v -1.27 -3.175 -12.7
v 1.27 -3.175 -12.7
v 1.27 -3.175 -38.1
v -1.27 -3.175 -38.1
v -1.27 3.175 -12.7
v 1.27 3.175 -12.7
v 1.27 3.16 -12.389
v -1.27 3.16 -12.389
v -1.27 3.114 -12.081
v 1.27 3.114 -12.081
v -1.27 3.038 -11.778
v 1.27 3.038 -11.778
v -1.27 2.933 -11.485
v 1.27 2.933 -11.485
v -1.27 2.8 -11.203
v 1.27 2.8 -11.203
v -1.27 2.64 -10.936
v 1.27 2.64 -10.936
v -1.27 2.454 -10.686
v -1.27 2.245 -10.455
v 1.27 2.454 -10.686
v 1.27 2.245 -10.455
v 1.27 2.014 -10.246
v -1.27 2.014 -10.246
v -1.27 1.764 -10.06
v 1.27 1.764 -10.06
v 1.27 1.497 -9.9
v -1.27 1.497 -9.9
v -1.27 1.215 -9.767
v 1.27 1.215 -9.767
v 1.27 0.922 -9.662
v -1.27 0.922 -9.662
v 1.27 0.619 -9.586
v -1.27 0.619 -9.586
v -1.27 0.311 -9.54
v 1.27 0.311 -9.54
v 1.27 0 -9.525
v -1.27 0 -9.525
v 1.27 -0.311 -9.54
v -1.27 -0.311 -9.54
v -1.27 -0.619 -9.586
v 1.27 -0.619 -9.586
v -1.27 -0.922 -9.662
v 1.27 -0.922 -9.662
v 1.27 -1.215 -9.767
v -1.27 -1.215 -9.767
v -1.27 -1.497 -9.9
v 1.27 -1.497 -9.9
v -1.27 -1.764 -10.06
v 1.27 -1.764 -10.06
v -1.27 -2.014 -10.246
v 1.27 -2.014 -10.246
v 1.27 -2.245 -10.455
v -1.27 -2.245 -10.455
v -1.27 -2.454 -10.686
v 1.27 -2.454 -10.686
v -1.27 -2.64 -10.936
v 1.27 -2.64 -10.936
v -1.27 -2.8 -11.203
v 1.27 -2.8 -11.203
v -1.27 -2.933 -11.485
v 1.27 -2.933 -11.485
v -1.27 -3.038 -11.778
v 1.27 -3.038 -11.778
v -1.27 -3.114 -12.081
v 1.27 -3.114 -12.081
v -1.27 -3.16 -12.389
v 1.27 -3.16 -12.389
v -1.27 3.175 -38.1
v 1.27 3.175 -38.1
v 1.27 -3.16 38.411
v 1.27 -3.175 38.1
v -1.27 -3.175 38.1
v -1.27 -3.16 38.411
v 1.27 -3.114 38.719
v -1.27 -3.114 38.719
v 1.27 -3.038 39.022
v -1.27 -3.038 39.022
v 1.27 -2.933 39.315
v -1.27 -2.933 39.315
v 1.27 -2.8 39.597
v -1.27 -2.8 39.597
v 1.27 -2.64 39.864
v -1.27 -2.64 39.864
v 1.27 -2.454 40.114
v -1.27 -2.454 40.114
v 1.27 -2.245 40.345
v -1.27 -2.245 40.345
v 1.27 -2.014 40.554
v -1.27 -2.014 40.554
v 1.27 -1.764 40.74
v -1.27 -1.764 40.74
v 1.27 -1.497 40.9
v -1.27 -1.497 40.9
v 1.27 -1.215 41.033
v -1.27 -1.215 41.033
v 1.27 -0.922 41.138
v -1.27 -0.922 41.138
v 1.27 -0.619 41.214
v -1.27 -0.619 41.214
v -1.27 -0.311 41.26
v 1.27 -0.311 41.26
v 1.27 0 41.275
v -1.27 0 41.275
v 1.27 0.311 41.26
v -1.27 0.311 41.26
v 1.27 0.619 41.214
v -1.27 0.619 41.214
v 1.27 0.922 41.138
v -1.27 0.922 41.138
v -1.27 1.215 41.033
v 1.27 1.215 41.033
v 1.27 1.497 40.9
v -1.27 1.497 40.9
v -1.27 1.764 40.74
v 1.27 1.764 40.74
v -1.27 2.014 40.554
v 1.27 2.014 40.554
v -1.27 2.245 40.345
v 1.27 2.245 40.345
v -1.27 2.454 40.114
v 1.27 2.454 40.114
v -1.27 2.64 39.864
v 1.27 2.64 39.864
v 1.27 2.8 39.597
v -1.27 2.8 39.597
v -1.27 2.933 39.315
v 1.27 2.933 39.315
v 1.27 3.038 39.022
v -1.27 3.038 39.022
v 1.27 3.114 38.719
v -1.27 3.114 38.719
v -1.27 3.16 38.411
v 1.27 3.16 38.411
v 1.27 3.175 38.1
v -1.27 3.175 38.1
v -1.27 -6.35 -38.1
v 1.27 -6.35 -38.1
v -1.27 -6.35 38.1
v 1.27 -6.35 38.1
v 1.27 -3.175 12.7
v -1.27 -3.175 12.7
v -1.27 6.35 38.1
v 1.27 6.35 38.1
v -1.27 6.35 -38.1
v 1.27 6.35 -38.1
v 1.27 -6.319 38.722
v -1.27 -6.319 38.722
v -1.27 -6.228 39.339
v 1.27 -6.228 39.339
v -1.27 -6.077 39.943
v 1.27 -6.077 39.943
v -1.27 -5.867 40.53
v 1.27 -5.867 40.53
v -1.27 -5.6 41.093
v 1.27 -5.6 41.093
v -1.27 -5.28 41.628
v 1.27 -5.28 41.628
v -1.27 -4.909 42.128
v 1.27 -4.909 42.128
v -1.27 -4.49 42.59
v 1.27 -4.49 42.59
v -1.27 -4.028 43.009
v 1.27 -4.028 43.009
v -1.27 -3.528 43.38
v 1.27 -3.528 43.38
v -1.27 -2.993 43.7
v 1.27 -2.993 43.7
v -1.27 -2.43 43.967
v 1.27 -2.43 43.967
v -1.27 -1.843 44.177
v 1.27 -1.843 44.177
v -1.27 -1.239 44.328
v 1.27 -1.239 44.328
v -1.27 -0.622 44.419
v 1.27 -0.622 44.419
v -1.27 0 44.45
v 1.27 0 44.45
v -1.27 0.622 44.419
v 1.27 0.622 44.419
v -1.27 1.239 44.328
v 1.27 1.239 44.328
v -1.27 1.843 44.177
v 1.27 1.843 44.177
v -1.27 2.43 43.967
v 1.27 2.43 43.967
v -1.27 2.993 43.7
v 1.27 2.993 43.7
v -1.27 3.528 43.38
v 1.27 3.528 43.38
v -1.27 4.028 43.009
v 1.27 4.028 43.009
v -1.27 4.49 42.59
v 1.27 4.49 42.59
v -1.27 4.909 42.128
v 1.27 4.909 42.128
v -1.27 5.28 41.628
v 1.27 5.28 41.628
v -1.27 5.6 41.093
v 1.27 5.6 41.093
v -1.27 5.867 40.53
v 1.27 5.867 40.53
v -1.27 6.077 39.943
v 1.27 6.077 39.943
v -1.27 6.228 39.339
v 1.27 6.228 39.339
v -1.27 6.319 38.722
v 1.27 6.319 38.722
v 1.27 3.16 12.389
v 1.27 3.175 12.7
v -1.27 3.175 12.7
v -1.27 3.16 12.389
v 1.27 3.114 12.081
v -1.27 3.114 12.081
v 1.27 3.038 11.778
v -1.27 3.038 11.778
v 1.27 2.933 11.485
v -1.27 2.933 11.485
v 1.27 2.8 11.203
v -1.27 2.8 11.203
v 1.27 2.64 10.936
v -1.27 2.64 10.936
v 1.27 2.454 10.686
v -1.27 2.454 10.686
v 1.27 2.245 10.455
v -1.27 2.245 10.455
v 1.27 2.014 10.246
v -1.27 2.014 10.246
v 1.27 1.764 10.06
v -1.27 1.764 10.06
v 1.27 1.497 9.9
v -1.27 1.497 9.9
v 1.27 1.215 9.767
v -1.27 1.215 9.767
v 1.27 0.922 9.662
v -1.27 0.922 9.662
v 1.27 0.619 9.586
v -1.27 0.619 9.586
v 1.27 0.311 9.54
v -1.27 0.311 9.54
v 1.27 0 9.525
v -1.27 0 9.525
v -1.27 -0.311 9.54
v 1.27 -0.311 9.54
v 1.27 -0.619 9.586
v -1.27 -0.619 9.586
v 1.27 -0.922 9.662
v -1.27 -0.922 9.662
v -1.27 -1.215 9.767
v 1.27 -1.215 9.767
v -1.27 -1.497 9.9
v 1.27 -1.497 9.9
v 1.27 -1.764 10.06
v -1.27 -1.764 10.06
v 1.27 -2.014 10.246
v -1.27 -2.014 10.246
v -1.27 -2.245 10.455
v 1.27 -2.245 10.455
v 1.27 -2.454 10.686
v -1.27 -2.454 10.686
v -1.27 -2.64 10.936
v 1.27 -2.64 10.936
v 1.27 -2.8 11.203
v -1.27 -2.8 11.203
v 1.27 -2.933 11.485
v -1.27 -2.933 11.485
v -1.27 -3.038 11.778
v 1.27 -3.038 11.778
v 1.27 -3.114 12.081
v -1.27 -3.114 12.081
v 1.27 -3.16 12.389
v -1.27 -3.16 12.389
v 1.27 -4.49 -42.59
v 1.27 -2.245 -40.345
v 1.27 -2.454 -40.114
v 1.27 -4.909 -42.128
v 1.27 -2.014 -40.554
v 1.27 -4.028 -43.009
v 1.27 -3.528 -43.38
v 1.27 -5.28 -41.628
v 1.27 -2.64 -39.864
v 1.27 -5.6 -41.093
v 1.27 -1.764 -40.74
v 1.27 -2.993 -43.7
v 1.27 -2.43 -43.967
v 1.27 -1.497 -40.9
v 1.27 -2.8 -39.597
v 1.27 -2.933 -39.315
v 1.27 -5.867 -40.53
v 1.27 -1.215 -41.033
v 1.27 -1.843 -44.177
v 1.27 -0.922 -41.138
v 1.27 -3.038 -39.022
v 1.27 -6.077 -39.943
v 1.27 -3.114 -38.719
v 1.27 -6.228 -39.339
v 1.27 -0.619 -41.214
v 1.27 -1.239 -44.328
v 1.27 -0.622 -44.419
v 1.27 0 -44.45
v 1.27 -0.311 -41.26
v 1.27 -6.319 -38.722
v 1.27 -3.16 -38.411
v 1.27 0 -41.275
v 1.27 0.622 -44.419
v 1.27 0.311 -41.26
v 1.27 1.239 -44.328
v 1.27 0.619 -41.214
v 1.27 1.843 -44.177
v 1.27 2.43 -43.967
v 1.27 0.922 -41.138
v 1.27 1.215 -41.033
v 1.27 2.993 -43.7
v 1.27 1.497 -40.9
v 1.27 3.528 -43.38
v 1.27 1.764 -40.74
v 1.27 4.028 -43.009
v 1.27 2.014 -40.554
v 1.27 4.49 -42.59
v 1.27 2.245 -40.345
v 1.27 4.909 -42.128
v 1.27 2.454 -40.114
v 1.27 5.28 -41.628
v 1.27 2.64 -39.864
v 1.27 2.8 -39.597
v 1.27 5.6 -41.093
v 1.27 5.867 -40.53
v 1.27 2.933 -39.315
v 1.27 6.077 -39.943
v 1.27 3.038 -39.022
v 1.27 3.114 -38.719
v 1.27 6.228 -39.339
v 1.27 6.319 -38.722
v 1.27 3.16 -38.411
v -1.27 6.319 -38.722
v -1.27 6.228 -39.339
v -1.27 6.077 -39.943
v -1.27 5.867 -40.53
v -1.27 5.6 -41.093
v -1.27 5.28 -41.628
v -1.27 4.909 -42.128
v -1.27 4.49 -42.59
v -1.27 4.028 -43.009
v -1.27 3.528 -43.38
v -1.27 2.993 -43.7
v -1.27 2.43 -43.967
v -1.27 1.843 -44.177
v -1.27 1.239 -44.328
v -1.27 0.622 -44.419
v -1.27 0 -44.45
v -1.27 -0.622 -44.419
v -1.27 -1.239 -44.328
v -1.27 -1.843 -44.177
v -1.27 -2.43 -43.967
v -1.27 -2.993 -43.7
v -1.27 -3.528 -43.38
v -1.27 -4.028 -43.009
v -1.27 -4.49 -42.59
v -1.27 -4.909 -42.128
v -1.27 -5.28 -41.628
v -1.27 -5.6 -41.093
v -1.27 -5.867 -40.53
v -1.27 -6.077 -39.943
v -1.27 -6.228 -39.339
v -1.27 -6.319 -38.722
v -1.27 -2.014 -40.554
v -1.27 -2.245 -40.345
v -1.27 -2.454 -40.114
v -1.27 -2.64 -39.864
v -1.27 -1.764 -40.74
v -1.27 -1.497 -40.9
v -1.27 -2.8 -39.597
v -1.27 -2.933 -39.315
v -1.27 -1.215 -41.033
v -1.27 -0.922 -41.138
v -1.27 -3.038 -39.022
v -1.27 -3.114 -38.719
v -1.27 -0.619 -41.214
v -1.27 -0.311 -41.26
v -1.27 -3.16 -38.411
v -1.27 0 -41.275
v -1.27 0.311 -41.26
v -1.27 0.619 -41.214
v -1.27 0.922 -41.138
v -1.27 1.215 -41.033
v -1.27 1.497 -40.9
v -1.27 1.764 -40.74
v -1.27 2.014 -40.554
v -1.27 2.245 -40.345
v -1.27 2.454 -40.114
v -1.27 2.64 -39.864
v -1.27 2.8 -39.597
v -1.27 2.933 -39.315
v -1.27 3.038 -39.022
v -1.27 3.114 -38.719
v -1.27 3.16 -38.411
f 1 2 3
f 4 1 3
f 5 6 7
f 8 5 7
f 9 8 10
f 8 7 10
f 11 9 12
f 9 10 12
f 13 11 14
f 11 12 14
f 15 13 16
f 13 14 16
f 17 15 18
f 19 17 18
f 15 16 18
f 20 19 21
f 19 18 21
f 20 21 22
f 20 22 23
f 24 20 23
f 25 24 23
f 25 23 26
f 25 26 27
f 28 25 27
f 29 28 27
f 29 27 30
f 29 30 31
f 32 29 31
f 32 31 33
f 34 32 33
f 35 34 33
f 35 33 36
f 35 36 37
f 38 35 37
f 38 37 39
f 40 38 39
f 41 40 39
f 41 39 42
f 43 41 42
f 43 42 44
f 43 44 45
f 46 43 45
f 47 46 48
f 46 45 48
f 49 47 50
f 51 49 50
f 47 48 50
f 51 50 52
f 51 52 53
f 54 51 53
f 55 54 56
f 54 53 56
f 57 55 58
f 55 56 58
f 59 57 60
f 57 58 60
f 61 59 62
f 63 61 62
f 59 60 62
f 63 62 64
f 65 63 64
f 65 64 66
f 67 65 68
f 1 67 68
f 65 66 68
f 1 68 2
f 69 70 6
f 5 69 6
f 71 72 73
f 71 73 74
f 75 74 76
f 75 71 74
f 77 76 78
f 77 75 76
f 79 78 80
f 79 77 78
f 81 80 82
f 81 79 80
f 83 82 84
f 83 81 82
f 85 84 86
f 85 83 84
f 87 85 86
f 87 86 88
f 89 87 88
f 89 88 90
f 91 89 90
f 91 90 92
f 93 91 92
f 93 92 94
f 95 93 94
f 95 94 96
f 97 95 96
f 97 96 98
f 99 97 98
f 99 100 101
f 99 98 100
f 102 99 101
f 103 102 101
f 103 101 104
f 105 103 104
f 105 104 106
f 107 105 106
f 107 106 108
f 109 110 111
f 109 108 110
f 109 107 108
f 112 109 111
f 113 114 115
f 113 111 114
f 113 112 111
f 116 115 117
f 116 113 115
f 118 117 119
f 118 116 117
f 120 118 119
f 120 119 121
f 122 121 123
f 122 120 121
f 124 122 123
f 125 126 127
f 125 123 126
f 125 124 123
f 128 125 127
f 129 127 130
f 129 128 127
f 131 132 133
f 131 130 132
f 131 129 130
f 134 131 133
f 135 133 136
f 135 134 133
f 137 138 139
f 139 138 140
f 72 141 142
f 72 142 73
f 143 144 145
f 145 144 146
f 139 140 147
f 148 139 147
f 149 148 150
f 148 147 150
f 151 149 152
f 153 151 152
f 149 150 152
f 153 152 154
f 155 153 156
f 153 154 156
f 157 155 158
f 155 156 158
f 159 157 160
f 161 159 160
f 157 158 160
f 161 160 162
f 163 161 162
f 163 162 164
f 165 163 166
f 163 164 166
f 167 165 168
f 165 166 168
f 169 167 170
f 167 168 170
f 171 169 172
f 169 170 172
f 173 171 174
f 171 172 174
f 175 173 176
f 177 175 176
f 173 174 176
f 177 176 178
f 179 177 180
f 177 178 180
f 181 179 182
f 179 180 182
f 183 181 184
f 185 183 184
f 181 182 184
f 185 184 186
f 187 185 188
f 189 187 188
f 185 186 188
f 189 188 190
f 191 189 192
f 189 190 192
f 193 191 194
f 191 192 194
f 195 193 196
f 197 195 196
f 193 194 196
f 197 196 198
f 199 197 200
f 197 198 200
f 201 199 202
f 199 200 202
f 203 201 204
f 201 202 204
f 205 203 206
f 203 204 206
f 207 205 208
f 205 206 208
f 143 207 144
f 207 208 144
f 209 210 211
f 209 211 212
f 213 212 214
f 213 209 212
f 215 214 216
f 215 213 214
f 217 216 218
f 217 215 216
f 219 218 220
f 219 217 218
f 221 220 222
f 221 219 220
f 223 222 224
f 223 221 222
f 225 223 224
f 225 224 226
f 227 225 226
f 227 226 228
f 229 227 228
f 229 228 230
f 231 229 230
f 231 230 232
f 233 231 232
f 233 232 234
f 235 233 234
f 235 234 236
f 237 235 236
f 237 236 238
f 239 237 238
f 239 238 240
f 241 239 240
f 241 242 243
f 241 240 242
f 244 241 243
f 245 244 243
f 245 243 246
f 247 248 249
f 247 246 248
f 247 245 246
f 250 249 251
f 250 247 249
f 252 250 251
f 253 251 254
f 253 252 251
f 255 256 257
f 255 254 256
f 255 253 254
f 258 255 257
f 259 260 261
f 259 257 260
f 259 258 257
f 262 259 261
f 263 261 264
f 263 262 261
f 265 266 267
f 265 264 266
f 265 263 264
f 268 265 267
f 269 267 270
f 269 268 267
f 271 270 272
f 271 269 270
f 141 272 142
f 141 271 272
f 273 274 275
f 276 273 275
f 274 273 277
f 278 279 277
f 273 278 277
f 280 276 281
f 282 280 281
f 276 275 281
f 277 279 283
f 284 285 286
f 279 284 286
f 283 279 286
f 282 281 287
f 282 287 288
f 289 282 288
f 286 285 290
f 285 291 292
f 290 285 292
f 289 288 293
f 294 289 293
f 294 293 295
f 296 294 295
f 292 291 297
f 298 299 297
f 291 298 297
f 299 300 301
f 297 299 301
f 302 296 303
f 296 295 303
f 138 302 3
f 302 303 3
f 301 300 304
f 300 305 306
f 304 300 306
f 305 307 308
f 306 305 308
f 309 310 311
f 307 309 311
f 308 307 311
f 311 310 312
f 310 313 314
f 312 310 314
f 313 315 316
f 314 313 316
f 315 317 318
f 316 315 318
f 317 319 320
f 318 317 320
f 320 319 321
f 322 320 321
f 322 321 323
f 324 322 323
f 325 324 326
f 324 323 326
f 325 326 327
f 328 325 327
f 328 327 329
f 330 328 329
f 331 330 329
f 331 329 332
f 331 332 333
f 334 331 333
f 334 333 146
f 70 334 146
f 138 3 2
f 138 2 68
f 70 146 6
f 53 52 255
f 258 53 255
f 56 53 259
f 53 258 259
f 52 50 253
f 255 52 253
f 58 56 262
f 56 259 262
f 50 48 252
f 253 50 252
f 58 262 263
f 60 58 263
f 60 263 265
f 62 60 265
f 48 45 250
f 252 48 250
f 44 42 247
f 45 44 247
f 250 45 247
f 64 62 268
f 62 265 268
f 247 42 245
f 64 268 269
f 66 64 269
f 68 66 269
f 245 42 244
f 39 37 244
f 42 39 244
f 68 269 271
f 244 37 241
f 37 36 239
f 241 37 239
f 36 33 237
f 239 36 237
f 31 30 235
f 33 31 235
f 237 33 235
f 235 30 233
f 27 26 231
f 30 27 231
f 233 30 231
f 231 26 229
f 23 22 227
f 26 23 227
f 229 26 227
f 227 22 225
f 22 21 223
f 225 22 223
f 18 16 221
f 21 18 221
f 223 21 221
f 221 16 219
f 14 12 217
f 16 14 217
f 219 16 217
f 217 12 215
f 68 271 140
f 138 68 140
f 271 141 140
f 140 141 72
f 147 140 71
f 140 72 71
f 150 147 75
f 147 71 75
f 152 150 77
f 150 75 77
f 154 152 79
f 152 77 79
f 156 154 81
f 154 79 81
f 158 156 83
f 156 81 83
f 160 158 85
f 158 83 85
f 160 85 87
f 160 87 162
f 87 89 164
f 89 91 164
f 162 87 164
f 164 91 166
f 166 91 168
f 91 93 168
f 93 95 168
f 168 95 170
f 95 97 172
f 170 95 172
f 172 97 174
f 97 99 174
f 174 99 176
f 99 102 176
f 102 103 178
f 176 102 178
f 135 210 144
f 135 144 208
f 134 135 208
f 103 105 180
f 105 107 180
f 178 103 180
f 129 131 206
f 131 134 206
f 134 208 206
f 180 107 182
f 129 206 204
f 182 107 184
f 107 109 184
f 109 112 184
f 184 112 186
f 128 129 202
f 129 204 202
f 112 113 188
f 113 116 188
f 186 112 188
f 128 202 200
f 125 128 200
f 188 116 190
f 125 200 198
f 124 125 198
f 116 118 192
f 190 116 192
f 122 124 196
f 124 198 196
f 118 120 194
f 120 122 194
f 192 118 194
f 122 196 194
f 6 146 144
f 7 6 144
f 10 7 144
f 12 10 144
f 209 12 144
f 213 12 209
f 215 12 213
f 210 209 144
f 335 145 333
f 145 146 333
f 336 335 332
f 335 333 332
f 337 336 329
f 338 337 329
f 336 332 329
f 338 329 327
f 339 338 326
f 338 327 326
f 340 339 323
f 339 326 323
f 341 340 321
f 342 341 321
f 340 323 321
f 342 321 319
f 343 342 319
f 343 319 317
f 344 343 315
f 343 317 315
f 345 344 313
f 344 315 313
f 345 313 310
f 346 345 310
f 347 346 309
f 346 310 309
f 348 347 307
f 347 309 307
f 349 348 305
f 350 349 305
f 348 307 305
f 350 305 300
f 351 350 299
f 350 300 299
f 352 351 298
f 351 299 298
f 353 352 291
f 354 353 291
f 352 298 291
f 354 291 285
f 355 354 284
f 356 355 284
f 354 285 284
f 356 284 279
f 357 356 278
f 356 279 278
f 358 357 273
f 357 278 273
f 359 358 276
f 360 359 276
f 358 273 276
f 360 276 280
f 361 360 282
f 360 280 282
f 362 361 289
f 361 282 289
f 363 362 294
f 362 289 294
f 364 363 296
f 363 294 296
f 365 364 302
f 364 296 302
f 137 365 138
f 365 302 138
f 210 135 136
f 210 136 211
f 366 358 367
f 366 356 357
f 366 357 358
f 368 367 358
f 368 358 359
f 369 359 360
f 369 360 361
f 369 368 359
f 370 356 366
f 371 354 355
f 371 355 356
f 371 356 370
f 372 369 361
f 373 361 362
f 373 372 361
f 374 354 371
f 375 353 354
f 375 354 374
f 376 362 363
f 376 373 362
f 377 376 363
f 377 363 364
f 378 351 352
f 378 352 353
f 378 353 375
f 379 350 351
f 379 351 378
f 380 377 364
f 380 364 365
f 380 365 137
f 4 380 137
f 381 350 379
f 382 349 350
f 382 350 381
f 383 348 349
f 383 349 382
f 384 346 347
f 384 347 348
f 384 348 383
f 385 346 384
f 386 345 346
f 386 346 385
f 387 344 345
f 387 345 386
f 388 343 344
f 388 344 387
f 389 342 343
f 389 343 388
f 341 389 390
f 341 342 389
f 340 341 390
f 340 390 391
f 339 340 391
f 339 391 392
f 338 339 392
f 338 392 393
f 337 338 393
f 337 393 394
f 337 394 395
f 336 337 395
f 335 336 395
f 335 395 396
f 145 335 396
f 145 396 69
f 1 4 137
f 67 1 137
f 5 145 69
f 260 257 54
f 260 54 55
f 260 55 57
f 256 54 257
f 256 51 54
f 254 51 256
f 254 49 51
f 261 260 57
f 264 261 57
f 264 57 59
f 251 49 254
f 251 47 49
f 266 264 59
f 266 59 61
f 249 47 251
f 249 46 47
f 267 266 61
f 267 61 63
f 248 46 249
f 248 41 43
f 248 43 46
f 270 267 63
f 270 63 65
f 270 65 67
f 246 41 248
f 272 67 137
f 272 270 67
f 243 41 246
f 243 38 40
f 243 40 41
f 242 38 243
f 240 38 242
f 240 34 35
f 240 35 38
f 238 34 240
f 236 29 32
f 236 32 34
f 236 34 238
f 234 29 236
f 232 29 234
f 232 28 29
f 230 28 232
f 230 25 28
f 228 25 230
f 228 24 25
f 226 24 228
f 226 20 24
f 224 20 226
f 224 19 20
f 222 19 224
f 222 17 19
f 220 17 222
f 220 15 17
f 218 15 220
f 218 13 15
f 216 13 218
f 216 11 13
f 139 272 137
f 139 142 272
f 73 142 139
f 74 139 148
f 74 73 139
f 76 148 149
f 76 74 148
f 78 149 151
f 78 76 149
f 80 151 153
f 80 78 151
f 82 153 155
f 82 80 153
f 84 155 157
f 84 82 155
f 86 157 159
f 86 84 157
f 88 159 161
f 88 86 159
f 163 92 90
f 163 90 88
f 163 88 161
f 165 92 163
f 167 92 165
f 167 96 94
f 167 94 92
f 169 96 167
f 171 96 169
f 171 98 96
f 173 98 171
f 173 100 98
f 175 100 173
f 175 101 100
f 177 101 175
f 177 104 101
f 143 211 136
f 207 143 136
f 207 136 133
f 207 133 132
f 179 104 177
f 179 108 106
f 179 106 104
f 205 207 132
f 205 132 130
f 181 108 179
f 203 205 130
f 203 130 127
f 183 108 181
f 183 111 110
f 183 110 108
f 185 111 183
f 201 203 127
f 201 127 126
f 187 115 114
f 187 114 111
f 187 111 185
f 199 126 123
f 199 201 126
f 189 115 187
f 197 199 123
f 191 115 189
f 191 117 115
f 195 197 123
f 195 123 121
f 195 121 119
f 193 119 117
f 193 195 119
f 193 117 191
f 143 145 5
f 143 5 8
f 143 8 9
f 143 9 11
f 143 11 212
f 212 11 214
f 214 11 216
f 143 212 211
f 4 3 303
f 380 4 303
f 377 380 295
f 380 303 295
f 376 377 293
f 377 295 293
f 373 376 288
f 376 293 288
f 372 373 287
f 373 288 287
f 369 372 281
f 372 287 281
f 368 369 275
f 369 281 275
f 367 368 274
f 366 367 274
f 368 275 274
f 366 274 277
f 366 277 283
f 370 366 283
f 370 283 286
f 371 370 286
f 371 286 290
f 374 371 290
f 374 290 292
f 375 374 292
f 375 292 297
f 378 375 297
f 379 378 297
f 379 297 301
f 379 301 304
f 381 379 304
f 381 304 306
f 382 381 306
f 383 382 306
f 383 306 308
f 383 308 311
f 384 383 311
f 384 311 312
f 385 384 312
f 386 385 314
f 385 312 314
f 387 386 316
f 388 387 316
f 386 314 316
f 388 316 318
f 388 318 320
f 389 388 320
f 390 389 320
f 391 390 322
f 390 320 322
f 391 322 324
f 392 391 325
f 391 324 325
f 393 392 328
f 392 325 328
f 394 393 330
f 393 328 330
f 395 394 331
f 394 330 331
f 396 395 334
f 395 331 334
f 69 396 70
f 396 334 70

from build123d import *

# Parameters (mm, degrees)
BOSS_EXTRUDE1_DEPTH = 1.27
CUT_EXTRUDE1_DEPTH  = 3.54


with BuildPart() as part:
    # Sketch1 → Boss-Extrude1 (new body, symmetric)
    with BuildSketch(Plane(origin=(0, 0, 0), x_dir=(0, 0, -1), z_dir=(1, 0, 0))):
        with BuildLine():
            Line((-38.1, 6.35), (38.1, 6.35))
            ThreePointArc((38.1, 6.35), (44.45, 0), (38.1, -6.35))
            Line((38.1, -6.35), (-38.1, -6.35))
            ThreePointArc((-38.1, -6.35), (-44.45, 0), (-38.1, 6.35))
        make_face()
    extrude(amount=BOSS_EXTRUDE1_DEPTH, both=True)

    # Sketch2 → Cut-Extrude1 (cut, through all)
    with BuildSketch(Plane(origin=(1.27, 0, 0), x_dir=(0, 0, -1), z_dir=(1, 0, 0))):
        with BuildLine():
            Line((-38.1, 3.175), (-12.7, 3.175))
            ThreePointArc((-12.7, 3.175), (-9.525, 0), (-12.7, -3.175))
            Line((-12.7, -3.175), (-38.1, -3.175))
            ThreePointArc((-38.1, -3.175), (-41.275, 0), (-38.1, 3.175))
        make_face()
        with BuildLine():
            Line((38.1, 3.175), (12.7, 3.175))
            ThreePointArc((12.7, 3.175), (9.525, 0), (12.7, -3.175))
            Line((12.7, -3.175), (38.1, -3.175))
            ThreePointArc((38.1, -3.175), (41.275, 0), (38.1, 3.175))
        make_face()
    extrude(amount=-CUT_EXTRUDE1_DEPTH, mode=Mode.SUBTRACT)


solid = part.part
